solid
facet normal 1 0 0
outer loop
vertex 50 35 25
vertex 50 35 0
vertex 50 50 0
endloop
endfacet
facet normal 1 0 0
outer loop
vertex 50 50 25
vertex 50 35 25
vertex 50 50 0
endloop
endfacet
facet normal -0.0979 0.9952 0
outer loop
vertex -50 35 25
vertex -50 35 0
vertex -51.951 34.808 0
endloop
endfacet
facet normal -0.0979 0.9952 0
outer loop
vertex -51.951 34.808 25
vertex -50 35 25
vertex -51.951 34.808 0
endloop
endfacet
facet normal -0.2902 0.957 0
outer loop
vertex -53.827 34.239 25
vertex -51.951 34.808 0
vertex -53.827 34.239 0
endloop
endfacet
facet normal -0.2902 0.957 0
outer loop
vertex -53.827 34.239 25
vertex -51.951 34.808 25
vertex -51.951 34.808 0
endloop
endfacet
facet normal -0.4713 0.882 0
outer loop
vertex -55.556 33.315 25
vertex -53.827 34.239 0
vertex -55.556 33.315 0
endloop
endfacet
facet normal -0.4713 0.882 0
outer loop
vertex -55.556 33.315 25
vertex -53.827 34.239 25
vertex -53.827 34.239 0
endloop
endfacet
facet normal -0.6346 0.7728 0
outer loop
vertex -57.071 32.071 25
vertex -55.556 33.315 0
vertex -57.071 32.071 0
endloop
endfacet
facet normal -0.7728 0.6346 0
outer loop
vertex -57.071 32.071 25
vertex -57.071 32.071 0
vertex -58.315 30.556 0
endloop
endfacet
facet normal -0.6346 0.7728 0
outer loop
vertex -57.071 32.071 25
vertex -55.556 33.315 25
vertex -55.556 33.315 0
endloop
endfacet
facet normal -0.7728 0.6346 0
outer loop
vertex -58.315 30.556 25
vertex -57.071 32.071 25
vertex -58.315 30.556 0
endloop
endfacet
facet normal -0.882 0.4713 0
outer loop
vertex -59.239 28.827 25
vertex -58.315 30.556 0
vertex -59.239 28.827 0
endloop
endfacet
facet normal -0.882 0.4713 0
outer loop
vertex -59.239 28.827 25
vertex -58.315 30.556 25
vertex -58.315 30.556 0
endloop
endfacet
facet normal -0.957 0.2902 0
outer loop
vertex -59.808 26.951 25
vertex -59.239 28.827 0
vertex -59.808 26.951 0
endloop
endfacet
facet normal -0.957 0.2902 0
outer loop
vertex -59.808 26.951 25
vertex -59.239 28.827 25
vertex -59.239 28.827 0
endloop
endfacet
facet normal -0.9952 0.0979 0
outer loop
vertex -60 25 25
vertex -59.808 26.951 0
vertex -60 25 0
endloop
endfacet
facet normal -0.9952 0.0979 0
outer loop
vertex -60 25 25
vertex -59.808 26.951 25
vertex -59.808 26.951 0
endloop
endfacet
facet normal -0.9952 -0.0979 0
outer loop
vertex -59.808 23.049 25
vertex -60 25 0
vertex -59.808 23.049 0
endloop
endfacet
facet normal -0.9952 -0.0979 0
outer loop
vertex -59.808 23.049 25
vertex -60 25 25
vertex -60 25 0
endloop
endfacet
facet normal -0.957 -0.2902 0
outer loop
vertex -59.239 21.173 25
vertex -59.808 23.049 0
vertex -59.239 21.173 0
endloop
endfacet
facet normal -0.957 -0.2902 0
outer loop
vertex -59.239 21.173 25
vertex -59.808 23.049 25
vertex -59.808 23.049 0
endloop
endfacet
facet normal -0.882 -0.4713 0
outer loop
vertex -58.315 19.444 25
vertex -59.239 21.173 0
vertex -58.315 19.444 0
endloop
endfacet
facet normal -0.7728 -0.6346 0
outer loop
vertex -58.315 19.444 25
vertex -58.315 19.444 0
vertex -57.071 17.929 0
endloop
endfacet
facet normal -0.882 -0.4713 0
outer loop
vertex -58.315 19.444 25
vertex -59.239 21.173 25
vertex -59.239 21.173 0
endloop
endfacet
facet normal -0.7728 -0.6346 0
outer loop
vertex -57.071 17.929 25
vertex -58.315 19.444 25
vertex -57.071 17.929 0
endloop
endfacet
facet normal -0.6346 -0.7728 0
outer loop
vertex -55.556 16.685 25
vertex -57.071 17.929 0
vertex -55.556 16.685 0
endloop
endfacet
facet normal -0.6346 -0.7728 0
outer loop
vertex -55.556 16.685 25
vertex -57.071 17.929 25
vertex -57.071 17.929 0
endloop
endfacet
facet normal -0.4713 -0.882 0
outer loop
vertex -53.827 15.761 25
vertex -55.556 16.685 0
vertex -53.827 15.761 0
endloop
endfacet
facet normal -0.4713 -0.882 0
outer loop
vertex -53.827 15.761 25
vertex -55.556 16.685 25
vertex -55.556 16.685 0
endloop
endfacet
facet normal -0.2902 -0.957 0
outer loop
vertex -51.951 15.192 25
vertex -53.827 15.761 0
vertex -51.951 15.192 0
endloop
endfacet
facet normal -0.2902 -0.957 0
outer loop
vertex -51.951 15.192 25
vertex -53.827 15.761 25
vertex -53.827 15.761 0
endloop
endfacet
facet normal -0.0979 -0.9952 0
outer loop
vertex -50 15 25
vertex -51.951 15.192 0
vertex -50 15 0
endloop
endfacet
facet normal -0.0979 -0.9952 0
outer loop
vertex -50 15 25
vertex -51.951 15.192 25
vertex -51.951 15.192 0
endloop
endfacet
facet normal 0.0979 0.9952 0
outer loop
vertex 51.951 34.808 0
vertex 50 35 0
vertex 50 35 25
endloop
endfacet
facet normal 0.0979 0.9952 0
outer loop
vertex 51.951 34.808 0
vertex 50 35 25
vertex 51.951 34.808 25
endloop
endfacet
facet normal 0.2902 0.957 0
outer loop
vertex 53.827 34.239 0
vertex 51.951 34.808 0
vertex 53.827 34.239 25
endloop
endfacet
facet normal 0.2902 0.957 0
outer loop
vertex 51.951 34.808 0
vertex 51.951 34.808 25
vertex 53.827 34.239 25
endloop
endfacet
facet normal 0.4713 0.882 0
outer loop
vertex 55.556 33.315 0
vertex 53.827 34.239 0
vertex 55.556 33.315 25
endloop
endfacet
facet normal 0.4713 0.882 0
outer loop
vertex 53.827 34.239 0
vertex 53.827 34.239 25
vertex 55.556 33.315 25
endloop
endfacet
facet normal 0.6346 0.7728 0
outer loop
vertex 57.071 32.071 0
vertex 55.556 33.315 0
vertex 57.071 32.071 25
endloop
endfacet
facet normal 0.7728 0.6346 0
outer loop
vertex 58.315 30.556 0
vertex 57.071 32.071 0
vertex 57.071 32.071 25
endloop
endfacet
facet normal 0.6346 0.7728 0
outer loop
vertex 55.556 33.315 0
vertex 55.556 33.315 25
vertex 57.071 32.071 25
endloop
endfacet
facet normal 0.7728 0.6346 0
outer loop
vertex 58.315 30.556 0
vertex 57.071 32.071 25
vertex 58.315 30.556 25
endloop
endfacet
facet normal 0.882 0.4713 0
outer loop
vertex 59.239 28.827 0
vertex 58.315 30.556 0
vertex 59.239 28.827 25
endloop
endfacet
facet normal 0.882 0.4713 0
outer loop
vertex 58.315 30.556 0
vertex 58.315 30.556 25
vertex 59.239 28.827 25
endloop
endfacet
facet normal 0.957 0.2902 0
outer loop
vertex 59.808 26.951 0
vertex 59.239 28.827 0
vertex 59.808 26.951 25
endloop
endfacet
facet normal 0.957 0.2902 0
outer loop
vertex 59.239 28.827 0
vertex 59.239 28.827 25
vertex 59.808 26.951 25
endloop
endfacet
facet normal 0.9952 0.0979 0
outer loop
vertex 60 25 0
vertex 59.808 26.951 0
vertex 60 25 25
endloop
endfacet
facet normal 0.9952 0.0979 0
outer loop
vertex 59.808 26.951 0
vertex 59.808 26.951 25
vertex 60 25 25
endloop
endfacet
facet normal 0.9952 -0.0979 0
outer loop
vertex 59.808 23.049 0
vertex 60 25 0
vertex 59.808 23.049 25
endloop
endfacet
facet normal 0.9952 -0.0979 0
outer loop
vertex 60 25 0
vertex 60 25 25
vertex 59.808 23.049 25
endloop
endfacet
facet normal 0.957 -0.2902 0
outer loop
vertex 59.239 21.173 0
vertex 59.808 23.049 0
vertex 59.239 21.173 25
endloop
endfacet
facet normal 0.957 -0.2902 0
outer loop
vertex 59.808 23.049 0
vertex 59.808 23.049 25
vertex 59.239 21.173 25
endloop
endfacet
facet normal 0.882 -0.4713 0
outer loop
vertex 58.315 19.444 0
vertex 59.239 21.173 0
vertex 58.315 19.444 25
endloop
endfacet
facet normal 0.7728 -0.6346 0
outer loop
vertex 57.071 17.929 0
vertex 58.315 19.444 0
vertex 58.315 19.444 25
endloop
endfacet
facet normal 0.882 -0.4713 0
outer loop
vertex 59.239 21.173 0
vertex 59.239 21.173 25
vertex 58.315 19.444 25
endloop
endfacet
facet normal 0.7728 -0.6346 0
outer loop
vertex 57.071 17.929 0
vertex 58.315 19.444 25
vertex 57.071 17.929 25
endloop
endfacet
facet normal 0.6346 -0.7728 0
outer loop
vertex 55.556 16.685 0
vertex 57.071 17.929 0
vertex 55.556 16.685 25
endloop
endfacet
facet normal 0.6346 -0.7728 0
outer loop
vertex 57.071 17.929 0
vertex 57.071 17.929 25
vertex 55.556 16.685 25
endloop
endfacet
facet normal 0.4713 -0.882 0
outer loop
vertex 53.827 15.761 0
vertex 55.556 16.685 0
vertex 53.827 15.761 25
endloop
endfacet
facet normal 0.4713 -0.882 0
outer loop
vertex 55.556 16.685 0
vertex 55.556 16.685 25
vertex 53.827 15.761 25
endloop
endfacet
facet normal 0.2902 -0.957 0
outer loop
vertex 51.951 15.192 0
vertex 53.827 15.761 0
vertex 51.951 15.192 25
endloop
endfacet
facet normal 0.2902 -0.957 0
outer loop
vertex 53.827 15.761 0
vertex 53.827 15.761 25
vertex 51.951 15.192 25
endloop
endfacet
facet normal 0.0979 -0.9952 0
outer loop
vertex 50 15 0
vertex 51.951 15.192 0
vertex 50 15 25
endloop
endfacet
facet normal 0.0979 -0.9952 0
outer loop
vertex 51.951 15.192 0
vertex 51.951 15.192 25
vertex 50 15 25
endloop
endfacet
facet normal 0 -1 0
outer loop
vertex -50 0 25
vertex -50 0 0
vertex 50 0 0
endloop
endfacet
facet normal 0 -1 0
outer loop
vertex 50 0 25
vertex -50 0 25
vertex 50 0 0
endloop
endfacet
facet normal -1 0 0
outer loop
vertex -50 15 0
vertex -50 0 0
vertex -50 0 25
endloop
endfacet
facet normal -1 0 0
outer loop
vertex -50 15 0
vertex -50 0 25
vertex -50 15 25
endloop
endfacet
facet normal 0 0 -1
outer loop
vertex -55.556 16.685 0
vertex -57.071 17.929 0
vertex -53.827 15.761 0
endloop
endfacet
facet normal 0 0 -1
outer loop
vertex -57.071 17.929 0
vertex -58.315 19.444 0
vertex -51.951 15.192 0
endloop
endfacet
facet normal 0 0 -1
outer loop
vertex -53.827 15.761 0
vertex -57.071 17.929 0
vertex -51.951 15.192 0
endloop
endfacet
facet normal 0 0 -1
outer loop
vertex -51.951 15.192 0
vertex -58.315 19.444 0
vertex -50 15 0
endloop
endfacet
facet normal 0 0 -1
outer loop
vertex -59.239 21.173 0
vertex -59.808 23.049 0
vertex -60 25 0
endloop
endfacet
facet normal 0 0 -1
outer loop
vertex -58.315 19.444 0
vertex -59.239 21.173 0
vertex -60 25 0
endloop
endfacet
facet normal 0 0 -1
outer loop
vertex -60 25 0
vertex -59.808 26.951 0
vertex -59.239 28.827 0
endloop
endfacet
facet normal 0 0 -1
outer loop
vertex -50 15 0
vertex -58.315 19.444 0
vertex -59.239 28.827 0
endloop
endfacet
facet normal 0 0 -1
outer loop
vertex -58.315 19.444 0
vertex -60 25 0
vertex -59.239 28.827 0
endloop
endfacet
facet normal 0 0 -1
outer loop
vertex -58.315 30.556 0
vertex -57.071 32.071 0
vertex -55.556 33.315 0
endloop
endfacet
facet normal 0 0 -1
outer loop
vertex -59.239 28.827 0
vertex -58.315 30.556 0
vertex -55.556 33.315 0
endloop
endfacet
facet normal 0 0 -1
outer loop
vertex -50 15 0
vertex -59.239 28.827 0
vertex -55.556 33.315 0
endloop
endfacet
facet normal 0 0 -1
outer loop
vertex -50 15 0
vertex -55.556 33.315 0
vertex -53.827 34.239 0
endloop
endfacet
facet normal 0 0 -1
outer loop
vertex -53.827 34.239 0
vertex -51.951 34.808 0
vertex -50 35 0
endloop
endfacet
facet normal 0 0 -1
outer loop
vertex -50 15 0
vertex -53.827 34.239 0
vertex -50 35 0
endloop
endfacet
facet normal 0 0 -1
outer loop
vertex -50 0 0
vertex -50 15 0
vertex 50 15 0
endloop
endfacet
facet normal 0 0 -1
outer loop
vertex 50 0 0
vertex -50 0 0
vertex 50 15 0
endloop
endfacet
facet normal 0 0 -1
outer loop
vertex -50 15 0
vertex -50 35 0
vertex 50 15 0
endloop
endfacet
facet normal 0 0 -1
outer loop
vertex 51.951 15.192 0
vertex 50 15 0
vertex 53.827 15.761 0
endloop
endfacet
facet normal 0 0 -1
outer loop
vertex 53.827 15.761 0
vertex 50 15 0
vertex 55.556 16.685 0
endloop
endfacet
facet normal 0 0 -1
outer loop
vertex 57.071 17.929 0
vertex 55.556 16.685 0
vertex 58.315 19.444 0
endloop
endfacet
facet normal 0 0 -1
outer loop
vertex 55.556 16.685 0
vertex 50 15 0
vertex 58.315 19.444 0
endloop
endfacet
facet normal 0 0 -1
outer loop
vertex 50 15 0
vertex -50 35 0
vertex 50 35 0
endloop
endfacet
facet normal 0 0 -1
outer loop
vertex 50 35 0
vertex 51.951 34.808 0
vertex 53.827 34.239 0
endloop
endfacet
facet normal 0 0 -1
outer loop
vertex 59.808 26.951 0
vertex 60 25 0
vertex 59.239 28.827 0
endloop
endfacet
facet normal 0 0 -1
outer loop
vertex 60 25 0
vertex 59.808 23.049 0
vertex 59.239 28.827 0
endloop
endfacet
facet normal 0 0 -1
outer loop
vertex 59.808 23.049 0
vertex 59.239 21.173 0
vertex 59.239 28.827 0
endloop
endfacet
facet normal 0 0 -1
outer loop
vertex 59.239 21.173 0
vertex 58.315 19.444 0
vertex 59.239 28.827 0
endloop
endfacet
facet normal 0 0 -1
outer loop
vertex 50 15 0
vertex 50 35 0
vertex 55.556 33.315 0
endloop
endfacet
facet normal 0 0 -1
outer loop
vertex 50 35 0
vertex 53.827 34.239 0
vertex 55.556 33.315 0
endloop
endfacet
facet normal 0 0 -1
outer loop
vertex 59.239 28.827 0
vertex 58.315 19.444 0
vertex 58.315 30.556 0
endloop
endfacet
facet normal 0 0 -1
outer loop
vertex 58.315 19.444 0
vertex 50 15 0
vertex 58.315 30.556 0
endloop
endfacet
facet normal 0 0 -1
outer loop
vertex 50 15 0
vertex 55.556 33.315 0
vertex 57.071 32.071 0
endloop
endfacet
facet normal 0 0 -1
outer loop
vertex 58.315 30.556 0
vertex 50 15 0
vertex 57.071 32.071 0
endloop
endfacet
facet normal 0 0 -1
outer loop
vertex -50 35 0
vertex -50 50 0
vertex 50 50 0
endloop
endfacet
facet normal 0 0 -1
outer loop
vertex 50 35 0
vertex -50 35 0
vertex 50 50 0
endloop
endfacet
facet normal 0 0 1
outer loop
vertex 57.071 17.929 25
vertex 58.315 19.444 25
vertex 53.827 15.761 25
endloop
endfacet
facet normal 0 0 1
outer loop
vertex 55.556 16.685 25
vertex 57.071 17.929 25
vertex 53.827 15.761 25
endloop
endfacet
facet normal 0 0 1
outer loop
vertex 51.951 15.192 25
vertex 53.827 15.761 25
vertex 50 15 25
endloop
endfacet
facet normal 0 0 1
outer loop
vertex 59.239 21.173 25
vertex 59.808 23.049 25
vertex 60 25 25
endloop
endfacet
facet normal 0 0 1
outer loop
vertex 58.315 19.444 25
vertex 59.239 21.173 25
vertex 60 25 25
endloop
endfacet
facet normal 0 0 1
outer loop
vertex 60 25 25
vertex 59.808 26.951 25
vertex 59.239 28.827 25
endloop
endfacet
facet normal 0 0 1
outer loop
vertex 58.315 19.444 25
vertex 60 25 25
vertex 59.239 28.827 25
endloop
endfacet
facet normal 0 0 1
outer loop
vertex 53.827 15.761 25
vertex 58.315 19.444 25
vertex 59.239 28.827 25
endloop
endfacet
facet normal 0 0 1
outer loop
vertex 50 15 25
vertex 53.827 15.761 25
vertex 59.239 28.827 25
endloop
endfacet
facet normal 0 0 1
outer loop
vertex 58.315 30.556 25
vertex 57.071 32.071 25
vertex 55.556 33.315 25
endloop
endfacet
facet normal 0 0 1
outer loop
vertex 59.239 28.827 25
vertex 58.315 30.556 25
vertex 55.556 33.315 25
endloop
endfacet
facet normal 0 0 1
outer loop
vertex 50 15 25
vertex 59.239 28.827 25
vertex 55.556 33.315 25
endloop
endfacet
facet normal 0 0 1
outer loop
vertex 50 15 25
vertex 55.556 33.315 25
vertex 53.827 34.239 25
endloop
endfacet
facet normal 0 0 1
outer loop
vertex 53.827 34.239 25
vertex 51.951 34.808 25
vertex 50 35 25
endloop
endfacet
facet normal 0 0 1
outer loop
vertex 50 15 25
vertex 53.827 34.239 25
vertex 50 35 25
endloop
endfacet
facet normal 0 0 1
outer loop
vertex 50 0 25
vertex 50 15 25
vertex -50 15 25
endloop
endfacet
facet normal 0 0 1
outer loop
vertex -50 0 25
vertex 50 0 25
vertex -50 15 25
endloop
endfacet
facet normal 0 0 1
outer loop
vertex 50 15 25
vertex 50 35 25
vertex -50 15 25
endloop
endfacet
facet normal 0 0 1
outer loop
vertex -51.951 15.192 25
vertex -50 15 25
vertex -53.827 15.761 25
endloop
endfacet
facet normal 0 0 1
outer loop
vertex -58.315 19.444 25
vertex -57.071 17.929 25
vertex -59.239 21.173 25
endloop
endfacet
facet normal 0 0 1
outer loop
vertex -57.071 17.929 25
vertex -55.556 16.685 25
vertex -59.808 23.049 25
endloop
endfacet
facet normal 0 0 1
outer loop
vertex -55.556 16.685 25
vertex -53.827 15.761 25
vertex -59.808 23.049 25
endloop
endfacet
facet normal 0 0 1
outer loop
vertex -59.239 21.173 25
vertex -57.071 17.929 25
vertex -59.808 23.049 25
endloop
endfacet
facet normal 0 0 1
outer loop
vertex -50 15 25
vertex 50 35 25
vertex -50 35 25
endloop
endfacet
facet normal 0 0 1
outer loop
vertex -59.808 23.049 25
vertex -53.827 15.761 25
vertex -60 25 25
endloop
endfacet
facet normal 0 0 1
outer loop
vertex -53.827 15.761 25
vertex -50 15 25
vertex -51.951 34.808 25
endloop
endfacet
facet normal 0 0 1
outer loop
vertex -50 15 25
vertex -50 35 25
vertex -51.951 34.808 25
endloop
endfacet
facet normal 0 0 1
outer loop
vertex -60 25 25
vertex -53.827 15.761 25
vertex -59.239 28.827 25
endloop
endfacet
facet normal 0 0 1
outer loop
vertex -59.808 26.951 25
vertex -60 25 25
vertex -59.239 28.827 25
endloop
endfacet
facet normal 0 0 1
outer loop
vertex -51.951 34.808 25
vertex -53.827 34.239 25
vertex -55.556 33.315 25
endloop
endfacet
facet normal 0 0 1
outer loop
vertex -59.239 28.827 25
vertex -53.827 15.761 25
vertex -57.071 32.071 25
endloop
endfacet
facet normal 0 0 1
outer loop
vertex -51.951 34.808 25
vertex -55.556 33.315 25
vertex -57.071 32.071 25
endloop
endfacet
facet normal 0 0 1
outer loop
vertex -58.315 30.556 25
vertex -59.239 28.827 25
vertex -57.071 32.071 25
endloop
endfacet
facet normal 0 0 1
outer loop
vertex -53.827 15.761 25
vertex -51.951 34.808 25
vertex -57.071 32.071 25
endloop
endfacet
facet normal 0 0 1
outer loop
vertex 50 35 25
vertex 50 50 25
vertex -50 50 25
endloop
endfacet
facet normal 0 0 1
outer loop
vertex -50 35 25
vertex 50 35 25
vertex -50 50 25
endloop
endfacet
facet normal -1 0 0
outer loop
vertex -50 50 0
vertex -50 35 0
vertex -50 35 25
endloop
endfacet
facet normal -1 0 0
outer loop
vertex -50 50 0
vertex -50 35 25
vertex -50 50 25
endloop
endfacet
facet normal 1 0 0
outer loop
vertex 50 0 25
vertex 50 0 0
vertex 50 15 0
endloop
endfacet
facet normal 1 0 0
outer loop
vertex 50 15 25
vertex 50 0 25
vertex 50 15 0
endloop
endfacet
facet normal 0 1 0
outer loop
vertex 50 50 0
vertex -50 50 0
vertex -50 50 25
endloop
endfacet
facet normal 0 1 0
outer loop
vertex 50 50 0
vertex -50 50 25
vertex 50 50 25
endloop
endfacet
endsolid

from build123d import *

# Parameters (mm, degrees)
F0_W     = 100
F0_H     = 50
F1_DEPTH = 25
F2_R     = 10
F3_DEPTH = 25


# Not quite as in the source:
# - a pattern or mirror of a feature is missing from the dataset's text; its kind, count and spacing are read off the source's solid


with BuildPart() as f1:
    # F0 (on Top) → F1 (new body)
    with BuildSketch(Plane.XY):
        with Locations((0, 25)):
            Rectangle(F0_W, F0_H)
    extrude(amount=F1_DEPTH)

    # F2 (on face) → F3 (join, through all)
    with BuildSketch(Plane.XY.offset(25)):
        with Locations((-50, 25)):
            Circle(F2_R)
    f3 = extrude(amount=-F3_DEPTH)

    # F3_copies: F3 across plane
    add(f3.mirror(Plane(origin=(0, 0, 0), x_dir=(0, 0, 1), z_dir=(1, 0, 0))))


solid = f1.part
